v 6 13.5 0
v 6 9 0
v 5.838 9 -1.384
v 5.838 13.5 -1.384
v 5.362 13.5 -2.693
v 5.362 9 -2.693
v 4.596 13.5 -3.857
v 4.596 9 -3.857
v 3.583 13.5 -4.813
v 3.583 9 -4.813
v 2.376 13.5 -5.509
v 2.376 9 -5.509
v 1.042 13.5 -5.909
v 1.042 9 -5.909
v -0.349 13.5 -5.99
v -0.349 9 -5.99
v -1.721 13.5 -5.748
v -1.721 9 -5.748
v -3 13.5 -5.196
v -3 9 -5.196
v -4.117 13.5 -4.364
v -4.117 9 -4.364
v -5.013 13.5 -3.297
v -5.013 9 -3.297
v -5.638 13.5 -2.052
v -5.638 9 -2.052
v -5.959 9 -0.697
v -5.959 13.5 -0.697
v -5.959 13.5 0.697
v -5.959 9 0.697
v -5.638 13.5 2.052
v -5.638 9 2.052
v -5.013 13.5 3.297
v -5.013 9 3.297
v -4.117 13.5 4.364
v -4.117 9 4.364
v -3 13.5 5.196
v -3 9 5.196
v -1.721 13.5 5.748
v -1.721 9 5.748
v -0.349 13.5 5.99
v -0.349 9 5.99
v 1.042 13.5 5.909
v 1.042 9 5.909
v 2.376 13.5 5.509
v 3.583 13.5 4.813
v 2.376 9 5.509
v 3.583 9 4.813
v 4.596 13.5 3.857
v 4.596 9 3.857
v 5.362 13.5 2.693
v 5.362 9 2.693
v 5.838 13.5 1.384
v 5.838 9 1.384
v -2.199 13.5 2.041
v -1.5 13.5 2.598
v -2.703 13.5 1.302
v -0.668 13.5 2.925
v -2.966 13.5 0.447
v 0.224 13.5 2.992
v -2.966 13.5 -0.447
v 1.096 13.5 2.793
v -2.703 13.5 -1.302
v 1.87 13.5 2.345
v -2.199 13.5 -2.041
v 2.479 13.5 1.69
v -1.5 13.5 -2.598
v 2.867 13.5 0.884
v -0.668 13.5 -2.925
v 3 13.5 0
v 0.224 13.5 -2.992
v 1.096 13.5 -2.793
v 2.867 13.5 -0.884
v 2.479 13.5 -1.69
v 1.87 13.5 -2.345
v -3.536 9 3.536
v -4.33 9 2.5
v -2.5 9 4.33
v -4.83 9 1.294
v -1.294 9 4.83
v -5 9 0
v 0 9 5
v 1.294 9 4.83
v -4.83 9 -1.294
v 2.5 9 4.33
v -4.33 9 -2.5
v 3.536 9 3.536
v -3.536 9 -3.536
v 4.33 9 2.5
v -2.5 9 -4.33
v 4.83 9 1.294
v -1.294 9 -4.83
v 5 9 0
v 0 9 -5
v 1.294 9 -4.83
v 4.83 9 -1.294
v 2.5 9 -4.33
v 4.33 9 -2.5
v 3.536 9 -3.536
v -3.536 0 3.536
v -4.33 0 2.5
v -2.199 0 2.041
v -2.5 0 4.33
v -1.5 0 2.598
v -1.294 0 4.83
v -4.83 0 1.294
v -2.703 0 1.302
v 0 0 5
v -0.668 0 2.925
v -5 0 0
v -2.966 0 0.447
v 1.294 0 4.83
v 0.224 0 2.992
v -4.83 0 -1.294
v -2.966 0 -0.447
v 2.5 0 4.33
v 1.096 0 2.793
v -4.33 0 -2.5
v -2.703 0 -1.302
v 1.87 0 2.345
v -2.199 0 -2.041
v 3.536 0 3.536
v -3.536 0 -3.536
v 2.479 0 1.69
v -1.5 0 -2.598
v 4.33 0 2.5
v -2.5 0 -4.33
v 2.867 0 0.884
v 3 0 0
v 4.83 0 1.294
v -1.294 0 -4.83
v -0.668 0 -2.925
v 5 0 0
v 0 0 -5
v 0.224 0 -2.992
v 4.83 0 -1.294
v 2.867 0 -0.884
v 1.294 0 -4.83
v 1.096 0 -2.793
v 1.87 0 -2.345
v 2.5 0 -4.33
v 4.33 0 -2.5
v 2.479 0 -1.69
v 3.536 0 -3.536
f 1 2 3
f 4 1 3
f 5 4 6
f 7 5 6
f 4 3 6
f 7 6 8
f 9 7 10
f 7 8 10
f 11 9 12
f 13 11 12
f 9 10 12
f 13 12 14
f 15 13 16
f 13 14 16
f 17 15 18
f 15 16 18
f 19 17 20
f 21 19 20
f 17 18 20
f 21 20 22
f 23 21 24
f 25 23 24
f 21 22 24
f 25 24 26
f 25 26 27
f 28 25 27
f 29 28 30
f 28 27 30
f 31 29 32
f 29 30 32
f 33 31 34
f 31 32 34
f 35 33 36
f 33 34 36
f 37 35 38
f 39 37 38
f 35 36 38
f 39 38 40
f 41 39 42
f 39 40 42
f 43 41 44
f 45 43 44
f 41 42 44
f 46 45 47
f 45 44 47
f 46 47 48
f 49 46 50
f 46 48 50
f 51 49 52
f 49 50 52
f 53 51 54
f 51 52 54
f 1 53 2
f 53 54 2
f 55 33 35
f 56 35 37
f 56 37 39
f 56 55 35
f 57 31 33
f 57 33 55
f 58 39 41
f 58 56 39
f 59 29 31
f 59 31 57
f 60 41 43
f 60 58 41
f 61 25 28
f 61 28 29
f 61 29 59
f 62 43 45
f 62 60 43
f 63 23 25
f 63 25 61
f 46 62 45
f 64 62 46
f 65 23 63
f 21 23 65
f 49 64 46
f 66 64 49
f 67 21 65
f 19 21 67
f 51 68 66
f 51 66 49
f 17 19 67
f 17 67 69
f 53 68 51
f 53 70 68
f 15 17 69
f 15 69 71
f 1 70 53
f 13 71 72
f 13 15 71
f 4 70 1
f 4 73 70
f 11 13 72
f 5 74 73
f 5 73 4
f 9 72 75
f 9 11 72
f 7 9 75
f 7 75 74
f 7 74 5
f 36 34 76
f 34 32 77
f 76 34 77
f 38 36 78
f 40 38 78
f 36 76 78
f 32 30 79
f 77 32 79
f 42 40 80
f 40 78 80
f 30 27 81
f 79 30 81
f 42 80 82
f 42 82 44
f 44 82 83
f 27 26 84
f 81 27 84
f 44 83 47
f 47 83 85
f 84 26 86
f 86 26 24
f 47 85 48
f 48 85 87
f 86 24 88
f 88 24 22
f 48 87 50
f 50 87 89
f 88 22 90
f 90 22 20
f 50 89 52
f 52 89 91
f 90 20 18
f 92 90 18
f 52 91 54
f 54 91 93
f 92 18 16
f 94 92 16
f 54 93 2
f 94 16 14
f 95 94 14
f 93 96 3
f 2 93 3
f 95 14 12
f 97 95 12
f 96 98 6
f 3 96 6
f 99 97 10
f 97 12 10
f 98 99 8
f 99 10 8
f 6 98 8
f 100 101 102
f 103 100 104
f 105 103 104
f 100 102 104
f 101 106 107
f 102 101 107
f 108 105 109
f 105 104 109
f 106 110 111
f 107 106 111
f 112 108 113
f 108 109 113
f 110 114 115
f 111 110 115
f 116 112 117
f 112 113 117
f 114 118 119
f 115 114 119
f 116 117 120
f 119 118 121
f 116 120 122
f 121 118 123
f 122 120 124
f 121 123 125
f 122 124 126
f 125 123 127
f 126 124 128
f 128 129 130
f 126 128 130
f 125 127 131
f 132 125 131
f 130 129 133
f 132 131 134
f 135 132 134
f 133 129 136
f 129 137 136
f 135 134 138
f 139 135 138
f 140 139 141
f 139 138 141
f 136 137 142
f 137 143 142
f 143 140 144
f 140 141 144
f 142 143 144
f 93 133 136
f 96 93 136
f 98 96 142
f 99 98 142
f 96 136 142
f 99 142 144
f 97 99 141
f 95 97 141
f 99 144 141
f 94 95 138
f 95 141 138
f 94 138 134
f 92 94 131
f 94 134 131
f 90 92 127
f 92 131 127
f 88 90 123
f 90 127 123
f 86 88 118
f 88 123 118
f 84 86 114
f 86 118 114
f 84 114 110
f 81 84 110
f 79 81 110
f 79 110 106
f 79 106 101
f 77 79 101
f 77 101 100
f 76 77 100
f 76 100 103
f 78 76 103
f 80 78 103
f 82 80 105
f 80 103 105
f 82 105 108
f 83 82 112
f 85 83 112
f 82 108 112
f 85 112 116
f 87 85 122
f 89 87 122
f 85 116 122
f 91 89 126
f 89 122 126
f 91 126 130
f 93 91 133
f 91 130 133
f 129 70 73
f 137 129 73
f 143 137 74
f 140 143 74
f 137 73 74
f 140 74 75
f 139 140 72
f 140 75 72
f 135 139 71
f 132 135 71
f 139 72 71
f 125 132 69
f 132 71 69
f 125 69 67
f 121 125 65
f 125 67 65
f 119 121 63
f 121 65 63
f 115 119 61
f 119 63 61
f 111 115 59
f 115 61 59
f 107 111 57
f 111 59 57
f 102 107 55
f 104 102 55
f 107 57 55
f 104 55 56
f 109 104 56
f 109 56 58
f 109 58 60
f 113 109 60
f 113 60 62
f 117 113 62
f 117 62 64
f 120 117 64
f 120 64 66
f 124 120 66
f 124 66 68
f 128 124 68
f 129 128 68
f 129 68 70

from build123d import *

# Parameters (mm, degrees)
SKETCH1_R               = 5
BOSS_EXTRUDE1_DEPTH     = 9
SKETCH2_R               = 6
BOSS_EXTRUDE2_DEPTH     = 4.5
SKETCH3_R               = 3
CUT_EXTRUDE1_DEPTH      = 1
CUT_EXTRUDE1_DEPTH_BACK = 14.5


with BuildPart() as part:
    # Sketch1 → Boss-Extrude1 (new body)
    with BuildSketch(Plane(origin=(0, 0, 0), x_dir=(1, 0, 0), z_dir=(0, 1, 0))):
        Circle(SKETCH1_R)
    extrude(amount=BOSS_EXTRUDE1_DEPTH)

    # Sketch2 → Boss-Extrude2 (add)
    with BuildSketch(Plane(origin=(0, 9, 0), x_dir=(1, 0, 0), z_dir=(0, 1, 0))):
        Circle(SKETCH2_R)
    extrude(amount=BOSS_EXTRUDE2_DEPTH)

    # Sketch3 → Cut-Extrude1 (cut, two sides)
    with BuildSketch(Plane(origin=(0, 13.5, 0), x_dir=(1, 0, 0), z_dir=(0, 1, 0))) as cut_extrude1_sk:
        Circle(SKETCH3_R)
    extrude(amount=CUT_EXTRUDE1_DEPTH, mode=Mode.SUBTRACT)
    extrude(cut_extrude1_sk.sketch, amount=-CUT_EXTRUDE1_DEPTH_BACK, mode=Mode.SUBTRACT)


solid = part.part
